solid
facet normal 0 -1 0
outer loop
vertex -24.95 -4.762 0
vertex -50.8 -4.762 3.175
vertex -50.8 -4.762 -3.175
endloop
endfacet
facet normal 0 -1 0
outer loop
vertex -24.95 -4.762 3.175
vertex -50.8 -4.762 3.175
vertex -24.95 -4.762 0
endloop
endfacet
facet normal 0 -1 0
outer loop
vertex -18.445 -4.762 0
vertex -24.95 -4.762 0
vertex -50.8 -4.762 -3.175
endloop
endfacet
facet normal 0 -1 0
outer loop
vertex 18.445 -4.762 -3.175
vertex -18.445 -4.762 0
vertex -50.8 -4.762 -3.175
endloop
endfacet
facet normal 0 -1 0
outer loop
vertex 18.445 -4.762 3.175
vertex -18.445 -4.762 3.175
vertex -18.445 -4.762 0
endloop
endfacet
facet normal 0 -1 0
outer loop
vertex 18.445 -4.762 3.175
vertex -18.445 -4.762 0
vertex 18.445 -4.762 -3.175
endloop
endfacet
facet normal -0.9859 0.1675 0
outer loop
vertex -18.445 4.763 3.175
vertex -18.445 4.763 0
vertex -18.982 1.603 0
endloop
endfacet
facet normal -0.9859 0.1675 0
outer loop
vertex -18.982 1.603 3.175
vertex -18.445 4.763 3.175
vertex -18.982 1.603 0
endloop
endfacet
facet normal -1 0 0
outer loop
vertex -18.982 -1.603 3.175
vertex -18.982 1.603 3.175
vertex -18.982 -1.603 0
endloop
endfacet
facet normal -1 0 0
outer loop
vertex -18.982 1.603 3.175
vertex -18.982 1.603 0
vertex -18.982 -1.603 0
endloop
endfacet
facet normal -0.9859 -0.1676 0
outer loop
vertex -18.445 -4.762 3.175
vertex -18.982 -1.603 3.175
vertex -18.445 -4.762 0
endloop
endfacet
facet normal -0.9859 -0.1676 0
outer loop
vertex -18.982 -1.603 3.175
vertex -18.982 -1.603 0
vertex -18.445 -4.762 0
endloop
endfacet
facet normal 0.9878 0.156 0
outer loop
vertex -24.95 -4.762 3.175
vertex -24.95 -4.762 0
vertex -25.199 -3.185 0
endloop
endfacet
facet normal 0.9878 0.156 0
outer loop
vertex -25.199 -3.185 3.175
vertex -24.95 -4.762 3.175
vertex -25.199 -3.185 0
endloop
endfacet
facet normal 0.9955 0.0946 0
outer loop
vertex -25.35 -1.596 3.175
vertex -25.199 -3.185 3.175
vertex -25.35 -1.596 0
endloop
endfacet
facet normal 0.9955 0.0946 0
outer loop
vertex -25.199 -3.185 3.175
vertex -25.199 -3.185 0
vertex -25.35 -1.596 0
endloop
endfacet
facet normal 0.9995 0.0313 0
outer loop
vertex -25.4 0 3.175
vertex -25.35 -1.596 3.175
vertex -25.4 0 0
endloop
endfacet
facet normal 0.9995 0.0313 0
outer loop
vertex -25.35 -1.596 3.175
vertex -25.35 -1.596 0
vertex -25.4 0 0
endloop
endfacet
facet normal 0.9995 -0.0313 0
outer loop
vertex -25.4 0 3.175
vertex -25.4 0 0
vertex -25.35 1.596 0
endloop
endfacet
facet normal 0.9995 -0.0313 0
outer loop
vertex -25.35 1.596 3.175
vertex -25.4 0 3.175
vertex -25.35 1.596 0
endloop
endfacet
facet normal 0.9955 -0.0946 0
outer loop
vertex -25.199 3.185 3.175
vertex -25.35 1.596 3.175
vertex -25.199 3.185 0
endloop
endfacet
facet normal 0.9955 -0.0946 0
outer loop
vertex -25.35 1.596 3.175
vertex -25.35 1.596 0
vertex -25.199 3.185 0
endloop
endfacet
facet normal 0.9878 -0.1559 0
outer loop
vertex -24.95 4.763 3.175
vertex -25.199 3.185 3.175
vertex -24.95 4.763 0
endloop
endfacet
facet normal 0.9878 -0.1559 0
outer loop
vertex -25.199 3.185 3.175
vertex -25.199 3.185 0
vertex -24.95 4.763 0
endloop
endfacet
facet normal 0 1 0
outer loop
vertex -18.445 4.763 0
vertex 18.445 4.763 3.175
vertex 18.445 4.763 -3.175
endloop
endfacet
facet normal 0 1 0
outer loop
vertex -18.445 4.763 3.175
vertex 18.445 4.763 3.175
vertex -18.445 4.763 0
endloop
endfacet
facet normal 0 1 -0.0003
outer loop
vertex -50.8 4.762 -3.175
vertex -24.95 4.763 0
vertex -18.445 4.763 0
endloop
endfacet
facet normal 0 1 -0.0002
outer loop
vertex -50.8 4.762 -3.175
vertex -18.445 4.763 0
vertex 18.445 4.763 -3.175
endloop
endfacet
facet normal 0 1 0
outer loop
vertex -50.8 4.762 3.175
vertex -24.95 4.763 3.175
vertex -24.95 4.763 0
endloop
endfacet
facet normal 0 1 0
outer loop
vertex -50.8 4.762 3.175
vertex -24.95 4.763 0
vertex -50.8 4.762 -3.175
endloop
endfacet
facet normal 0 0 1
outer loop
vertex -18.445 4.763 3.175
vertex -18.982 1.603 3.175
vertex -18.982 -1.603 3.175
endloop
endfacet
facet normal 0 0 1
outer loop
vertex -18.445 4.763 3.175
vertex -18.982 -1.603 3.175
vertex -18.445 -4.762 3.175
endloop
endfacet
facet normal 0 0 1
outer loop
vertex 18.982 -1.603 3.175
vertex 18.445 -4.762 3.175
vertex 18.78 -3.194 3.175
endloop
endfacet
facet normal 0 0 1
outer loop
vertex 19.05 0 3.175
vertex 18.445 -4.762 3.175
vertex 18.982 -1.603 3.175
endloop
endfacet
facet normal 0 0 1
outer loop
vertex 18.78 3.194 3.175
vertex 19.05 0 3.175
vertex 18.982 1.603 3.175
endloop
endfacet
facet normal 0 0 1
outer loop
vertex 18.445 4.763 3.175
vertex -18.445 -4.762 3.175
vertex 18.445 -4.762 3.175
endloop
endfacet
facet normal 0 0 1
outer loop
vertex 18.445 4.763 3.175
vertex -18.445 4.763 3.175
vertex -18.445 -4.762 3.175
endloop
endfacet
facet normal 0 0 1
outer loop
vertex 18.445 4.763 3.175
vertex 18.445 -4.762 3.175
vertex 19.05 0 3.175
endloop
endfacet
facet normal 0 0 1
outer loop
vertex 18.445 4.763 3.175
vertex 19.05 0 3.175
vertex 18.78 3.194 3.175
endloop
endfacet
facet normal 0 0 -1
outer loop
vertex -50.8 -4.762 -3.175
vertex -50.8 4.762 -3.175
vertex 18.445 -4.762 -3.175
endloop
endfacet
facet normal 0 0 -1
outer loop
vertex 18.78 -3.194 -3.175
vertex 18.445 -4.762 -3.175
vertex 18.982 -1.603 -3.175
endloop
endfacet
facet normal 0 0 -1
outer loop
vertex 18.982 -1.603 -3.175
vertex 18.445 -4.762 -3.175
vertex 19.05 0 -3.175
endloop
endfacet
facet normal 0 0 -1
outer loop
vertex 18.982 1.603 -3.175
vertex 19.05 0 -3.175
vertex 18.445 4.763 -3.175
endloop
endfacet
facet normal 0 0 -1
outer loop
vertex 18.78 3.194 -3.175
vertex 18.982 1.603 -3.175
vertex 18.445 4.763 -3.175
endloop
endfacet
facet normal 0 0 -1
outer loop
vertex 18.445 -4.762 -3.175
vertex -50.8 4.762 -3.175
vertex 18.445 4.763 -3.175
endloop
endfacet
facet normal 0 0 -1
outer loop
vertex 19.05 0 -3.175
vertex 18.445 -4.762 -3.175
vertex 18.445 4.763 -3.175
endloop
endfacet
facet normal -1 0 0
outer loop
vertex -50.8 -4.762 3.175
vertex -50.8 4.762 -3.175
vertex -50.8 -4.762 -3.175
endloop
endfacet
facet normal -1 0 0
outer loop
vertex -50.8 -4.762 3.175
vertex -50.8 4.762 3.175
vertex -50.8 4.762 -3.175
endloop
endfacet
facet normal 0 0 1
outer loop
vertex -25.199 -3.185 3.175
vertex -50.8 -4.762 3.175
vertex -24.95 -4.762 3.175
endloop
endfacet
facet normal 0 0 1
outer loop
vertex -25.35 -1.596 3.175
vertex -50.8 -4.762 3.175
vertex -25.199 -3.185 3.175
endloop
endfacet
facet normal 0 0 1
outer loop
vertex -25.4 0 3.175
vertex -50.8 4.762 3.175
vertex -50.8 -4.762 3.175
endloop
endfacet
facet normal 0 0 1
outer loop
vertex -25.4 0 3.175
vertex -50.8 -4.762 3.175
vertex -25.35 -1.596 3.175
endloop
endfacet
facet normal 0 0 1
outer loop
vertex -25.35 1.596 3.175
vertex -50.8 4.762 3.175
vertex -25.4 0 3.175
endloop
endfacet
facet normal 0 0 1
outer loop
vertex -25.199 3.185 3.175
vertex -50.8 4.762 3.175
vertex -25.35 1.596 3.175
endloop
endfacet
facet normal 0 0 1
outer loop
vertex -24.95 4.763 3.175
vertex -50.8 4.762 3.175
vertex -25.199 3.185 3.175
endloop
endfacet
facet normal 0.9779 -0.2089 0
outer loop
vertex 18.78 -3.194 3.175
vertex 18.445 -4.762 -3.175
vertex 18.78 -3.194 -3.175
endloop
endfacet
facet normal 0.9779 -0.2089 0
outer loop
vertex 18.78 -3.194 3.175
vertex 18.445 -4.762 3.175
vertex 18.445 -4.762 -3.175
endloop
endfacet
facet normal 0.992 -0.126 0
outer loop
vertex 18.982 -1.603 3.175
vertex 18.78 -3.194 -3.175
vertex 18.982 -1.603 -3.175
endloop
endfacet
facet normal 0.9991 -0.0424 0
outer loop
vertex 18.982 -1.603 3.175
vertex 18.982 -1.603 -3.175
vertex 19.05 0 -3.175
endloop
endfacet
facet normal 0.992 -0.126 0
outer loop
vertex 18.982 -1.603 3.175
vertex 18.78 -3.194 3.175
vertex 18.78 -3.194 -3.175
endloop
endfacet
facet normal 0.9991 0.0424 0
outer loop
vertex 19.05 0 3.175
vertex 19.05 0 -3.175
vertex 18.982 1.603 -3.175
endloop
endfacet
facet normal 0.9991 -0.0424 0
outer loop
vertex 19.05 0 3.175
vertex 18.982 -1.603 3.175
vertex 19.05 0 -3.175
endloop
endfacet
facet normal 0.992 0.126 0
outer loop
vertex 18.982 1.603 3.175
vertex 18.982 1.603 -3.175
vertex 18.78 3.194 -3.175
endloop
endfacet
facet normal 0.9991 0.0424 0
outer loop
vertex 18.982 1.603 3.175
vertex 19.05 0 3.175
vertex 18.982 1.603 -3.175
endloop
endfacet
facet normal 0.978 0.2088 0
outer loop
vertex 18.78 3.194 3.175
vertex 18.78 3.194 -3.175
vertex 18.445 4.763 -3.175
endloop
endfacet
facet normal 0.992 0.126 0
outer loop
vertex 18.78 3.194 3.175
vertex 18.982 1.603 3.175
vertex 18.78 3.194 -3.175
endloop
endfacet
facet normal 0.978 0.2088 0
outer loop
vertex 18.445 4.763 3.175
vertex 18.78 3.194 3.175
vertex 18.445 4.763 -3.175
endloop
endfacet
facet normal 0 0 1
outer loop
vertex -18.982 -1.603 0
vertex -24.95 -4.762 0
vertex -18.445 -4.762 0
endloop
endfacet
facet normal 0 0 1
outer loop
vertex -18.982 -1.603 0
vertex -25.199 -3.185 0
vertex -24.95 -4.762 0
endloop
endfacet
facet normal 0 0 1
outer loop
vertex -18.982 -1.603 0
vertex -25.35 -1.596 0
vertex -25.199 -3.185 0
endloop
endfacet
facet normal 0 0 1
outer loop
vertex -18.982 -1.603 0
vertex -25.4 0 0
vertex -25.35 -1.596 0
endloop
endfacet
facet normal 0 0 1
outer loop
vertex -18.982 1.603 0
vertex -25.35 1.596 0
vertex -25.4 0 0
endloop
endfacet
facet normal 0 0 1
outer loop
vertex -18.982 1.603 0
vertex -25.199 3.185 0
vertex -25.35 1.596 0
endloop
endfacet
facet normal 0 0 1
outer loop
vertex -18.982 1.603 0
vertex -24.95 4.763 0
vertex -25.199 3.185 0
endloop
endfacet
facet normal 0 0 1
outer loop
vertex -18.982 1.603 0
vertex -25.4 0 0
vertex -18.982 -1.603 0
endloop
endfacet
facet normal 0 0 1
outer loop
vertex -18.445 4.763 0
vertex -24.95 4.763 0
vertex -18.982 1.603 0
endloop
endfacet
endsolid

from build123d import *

# Parameters (mm, degrees)
F0_W     = 36.8901663726
F0_H     = 9.525
F1_DEPTH = 3.175
F2_DEPTH = 3.175


with BuildPart() as f1:
    # F0 (on Top) → F1 (new body)
    with BuildSketch(Plane.XY):
        with BuildLine():
            ThreePointArc((18.4450831863, -4.7625), (18.8981657139, -2.4003817718), (19.05, 0))
            ThreePointArc((19.05, 0), (18.8981657139, 2.4003817718), (18.4450831863, 4.7625))
            Line((18.4450831863, 4.7625), (18.4450831863, -4.7625))
        make_face()
        Rectangle(F0_W, F0_H)
        with BuildLine():
            Line((-18.4450831863, -4.7625), (-18.4450831863, 4.7625))
            ThreePointArc((-18.4450831863, 4.7625), (-19.05, 0), (-18.4450831863, -4.7625))
        make_face()
    extrude(amount=F1_DEPTH)



with BuildPart() as f1b:
    # F0 (on Top) → F1, piece 2 (new body)
    with BuildSketch(Plane.XY):
        with BuildLine():
            ThreePointArc((-25.4, 0), (-25.2871294453, 2.3918788461), (-24.9495209122, 4.7625))
            Line((-24.9495209122, 4.7625), (-25.4, 4.7625))
            Line((-25.4, 4.7625), (-25.4, 0))
        make_face()
        with BuildLine():
            Line((-25.4, -4.7625), (-24.9495209122, -4.7625))
            ThreePointArc((-24.9495209122, -4.7625), (-25.2871294453, -2.3918788461), (-25.4, 0))
            Line((-25.4, 0), (-25.4, -4.7625))
        make_face()
        Polygon((-25.4, 0), (-25.4, 4.7625), (-50.8, 4.7625), (-50.8, -4.7625), (-25.4, -4.7625), align=None)
    extrude(amount=F1_DEPTH)


with BuildPart() as f1_1:
    add(f1.part)

    add(f1b.part)  # F2 merges F1b
    # F0 (on Top) → F2 (join)
    with BuildSketch(Plane.XY):
        with BuildLine():
            ThreePointArc((18.4450831863, -4.7625), (18.8981657139, -2.4003817718), (19.05, 0))
            ThreePointArc((19.05, 0), (18.8981657139, 2.4003817718), (18.4450831863, 4.7625))
            Line((18.4450831863, 4.7625), (18.4450831863, -4.7625))
        make_face()
        Rectangle(F0_W, F0_H)
        with BuildLine():
            Line((-18.4450831863, -4.7625), (-18.4450831863, 4.7625))
            ThreePointArc((-18.4450831863, 4.7625), (-19.05, 0), (-18.4450831863, -4.7625))
        make_face()
        with BuildLine():
            ThreePointArc((-18.4450831863, -4.7625), (-19.05, 0), (-18.4450831863, 4.7625))
            Line((-18.4450831863, 4.7625), (-24.9495209122, 4.7625))
            ThreePointArc((-24.9495209122, 4.7625), (-25.2871294453, 2.3918788461), (-25.4, 0))
            ThreePointArc((-25.4, 0), (-25.2871294453, -2.3918788461), (-24.9495209122, -4.7625))
            Line((-24.9495209122, -4.7625), (-18.4450831863, -4.7625))
        make_face()
        with BuildLine():
            ThreePointArc((-25.4, 0), (-25.2871294453, 2.3918788461), (-24.9495209122, 4.7625))
            Line((-24.9495209122, 4.7625), (-25.4, 4.7625))
            Line((-25.4, 4.7625), (-25.4, 0))
        make_face()
        with BuildLine():
            Line((-25.4, -4.7625), (-24.9495209122, -4.7625))
            ThreePointArc((-24.9495209122, -4.7625), (-25.2871294453, -2.3918788461), (-25.4, 0))
            Line((-25.4, 0), (-25.4, -4.7625))
        make_face()
        Polygon((-25.4, 0), (-25.4, 4.7625), (-50.8, 4.7625), (-50.8, -4.7625), (-25.4, -4.7625), align=None)
    extrude(amount=-F2_DEPTH)


solid = f1_1.part
